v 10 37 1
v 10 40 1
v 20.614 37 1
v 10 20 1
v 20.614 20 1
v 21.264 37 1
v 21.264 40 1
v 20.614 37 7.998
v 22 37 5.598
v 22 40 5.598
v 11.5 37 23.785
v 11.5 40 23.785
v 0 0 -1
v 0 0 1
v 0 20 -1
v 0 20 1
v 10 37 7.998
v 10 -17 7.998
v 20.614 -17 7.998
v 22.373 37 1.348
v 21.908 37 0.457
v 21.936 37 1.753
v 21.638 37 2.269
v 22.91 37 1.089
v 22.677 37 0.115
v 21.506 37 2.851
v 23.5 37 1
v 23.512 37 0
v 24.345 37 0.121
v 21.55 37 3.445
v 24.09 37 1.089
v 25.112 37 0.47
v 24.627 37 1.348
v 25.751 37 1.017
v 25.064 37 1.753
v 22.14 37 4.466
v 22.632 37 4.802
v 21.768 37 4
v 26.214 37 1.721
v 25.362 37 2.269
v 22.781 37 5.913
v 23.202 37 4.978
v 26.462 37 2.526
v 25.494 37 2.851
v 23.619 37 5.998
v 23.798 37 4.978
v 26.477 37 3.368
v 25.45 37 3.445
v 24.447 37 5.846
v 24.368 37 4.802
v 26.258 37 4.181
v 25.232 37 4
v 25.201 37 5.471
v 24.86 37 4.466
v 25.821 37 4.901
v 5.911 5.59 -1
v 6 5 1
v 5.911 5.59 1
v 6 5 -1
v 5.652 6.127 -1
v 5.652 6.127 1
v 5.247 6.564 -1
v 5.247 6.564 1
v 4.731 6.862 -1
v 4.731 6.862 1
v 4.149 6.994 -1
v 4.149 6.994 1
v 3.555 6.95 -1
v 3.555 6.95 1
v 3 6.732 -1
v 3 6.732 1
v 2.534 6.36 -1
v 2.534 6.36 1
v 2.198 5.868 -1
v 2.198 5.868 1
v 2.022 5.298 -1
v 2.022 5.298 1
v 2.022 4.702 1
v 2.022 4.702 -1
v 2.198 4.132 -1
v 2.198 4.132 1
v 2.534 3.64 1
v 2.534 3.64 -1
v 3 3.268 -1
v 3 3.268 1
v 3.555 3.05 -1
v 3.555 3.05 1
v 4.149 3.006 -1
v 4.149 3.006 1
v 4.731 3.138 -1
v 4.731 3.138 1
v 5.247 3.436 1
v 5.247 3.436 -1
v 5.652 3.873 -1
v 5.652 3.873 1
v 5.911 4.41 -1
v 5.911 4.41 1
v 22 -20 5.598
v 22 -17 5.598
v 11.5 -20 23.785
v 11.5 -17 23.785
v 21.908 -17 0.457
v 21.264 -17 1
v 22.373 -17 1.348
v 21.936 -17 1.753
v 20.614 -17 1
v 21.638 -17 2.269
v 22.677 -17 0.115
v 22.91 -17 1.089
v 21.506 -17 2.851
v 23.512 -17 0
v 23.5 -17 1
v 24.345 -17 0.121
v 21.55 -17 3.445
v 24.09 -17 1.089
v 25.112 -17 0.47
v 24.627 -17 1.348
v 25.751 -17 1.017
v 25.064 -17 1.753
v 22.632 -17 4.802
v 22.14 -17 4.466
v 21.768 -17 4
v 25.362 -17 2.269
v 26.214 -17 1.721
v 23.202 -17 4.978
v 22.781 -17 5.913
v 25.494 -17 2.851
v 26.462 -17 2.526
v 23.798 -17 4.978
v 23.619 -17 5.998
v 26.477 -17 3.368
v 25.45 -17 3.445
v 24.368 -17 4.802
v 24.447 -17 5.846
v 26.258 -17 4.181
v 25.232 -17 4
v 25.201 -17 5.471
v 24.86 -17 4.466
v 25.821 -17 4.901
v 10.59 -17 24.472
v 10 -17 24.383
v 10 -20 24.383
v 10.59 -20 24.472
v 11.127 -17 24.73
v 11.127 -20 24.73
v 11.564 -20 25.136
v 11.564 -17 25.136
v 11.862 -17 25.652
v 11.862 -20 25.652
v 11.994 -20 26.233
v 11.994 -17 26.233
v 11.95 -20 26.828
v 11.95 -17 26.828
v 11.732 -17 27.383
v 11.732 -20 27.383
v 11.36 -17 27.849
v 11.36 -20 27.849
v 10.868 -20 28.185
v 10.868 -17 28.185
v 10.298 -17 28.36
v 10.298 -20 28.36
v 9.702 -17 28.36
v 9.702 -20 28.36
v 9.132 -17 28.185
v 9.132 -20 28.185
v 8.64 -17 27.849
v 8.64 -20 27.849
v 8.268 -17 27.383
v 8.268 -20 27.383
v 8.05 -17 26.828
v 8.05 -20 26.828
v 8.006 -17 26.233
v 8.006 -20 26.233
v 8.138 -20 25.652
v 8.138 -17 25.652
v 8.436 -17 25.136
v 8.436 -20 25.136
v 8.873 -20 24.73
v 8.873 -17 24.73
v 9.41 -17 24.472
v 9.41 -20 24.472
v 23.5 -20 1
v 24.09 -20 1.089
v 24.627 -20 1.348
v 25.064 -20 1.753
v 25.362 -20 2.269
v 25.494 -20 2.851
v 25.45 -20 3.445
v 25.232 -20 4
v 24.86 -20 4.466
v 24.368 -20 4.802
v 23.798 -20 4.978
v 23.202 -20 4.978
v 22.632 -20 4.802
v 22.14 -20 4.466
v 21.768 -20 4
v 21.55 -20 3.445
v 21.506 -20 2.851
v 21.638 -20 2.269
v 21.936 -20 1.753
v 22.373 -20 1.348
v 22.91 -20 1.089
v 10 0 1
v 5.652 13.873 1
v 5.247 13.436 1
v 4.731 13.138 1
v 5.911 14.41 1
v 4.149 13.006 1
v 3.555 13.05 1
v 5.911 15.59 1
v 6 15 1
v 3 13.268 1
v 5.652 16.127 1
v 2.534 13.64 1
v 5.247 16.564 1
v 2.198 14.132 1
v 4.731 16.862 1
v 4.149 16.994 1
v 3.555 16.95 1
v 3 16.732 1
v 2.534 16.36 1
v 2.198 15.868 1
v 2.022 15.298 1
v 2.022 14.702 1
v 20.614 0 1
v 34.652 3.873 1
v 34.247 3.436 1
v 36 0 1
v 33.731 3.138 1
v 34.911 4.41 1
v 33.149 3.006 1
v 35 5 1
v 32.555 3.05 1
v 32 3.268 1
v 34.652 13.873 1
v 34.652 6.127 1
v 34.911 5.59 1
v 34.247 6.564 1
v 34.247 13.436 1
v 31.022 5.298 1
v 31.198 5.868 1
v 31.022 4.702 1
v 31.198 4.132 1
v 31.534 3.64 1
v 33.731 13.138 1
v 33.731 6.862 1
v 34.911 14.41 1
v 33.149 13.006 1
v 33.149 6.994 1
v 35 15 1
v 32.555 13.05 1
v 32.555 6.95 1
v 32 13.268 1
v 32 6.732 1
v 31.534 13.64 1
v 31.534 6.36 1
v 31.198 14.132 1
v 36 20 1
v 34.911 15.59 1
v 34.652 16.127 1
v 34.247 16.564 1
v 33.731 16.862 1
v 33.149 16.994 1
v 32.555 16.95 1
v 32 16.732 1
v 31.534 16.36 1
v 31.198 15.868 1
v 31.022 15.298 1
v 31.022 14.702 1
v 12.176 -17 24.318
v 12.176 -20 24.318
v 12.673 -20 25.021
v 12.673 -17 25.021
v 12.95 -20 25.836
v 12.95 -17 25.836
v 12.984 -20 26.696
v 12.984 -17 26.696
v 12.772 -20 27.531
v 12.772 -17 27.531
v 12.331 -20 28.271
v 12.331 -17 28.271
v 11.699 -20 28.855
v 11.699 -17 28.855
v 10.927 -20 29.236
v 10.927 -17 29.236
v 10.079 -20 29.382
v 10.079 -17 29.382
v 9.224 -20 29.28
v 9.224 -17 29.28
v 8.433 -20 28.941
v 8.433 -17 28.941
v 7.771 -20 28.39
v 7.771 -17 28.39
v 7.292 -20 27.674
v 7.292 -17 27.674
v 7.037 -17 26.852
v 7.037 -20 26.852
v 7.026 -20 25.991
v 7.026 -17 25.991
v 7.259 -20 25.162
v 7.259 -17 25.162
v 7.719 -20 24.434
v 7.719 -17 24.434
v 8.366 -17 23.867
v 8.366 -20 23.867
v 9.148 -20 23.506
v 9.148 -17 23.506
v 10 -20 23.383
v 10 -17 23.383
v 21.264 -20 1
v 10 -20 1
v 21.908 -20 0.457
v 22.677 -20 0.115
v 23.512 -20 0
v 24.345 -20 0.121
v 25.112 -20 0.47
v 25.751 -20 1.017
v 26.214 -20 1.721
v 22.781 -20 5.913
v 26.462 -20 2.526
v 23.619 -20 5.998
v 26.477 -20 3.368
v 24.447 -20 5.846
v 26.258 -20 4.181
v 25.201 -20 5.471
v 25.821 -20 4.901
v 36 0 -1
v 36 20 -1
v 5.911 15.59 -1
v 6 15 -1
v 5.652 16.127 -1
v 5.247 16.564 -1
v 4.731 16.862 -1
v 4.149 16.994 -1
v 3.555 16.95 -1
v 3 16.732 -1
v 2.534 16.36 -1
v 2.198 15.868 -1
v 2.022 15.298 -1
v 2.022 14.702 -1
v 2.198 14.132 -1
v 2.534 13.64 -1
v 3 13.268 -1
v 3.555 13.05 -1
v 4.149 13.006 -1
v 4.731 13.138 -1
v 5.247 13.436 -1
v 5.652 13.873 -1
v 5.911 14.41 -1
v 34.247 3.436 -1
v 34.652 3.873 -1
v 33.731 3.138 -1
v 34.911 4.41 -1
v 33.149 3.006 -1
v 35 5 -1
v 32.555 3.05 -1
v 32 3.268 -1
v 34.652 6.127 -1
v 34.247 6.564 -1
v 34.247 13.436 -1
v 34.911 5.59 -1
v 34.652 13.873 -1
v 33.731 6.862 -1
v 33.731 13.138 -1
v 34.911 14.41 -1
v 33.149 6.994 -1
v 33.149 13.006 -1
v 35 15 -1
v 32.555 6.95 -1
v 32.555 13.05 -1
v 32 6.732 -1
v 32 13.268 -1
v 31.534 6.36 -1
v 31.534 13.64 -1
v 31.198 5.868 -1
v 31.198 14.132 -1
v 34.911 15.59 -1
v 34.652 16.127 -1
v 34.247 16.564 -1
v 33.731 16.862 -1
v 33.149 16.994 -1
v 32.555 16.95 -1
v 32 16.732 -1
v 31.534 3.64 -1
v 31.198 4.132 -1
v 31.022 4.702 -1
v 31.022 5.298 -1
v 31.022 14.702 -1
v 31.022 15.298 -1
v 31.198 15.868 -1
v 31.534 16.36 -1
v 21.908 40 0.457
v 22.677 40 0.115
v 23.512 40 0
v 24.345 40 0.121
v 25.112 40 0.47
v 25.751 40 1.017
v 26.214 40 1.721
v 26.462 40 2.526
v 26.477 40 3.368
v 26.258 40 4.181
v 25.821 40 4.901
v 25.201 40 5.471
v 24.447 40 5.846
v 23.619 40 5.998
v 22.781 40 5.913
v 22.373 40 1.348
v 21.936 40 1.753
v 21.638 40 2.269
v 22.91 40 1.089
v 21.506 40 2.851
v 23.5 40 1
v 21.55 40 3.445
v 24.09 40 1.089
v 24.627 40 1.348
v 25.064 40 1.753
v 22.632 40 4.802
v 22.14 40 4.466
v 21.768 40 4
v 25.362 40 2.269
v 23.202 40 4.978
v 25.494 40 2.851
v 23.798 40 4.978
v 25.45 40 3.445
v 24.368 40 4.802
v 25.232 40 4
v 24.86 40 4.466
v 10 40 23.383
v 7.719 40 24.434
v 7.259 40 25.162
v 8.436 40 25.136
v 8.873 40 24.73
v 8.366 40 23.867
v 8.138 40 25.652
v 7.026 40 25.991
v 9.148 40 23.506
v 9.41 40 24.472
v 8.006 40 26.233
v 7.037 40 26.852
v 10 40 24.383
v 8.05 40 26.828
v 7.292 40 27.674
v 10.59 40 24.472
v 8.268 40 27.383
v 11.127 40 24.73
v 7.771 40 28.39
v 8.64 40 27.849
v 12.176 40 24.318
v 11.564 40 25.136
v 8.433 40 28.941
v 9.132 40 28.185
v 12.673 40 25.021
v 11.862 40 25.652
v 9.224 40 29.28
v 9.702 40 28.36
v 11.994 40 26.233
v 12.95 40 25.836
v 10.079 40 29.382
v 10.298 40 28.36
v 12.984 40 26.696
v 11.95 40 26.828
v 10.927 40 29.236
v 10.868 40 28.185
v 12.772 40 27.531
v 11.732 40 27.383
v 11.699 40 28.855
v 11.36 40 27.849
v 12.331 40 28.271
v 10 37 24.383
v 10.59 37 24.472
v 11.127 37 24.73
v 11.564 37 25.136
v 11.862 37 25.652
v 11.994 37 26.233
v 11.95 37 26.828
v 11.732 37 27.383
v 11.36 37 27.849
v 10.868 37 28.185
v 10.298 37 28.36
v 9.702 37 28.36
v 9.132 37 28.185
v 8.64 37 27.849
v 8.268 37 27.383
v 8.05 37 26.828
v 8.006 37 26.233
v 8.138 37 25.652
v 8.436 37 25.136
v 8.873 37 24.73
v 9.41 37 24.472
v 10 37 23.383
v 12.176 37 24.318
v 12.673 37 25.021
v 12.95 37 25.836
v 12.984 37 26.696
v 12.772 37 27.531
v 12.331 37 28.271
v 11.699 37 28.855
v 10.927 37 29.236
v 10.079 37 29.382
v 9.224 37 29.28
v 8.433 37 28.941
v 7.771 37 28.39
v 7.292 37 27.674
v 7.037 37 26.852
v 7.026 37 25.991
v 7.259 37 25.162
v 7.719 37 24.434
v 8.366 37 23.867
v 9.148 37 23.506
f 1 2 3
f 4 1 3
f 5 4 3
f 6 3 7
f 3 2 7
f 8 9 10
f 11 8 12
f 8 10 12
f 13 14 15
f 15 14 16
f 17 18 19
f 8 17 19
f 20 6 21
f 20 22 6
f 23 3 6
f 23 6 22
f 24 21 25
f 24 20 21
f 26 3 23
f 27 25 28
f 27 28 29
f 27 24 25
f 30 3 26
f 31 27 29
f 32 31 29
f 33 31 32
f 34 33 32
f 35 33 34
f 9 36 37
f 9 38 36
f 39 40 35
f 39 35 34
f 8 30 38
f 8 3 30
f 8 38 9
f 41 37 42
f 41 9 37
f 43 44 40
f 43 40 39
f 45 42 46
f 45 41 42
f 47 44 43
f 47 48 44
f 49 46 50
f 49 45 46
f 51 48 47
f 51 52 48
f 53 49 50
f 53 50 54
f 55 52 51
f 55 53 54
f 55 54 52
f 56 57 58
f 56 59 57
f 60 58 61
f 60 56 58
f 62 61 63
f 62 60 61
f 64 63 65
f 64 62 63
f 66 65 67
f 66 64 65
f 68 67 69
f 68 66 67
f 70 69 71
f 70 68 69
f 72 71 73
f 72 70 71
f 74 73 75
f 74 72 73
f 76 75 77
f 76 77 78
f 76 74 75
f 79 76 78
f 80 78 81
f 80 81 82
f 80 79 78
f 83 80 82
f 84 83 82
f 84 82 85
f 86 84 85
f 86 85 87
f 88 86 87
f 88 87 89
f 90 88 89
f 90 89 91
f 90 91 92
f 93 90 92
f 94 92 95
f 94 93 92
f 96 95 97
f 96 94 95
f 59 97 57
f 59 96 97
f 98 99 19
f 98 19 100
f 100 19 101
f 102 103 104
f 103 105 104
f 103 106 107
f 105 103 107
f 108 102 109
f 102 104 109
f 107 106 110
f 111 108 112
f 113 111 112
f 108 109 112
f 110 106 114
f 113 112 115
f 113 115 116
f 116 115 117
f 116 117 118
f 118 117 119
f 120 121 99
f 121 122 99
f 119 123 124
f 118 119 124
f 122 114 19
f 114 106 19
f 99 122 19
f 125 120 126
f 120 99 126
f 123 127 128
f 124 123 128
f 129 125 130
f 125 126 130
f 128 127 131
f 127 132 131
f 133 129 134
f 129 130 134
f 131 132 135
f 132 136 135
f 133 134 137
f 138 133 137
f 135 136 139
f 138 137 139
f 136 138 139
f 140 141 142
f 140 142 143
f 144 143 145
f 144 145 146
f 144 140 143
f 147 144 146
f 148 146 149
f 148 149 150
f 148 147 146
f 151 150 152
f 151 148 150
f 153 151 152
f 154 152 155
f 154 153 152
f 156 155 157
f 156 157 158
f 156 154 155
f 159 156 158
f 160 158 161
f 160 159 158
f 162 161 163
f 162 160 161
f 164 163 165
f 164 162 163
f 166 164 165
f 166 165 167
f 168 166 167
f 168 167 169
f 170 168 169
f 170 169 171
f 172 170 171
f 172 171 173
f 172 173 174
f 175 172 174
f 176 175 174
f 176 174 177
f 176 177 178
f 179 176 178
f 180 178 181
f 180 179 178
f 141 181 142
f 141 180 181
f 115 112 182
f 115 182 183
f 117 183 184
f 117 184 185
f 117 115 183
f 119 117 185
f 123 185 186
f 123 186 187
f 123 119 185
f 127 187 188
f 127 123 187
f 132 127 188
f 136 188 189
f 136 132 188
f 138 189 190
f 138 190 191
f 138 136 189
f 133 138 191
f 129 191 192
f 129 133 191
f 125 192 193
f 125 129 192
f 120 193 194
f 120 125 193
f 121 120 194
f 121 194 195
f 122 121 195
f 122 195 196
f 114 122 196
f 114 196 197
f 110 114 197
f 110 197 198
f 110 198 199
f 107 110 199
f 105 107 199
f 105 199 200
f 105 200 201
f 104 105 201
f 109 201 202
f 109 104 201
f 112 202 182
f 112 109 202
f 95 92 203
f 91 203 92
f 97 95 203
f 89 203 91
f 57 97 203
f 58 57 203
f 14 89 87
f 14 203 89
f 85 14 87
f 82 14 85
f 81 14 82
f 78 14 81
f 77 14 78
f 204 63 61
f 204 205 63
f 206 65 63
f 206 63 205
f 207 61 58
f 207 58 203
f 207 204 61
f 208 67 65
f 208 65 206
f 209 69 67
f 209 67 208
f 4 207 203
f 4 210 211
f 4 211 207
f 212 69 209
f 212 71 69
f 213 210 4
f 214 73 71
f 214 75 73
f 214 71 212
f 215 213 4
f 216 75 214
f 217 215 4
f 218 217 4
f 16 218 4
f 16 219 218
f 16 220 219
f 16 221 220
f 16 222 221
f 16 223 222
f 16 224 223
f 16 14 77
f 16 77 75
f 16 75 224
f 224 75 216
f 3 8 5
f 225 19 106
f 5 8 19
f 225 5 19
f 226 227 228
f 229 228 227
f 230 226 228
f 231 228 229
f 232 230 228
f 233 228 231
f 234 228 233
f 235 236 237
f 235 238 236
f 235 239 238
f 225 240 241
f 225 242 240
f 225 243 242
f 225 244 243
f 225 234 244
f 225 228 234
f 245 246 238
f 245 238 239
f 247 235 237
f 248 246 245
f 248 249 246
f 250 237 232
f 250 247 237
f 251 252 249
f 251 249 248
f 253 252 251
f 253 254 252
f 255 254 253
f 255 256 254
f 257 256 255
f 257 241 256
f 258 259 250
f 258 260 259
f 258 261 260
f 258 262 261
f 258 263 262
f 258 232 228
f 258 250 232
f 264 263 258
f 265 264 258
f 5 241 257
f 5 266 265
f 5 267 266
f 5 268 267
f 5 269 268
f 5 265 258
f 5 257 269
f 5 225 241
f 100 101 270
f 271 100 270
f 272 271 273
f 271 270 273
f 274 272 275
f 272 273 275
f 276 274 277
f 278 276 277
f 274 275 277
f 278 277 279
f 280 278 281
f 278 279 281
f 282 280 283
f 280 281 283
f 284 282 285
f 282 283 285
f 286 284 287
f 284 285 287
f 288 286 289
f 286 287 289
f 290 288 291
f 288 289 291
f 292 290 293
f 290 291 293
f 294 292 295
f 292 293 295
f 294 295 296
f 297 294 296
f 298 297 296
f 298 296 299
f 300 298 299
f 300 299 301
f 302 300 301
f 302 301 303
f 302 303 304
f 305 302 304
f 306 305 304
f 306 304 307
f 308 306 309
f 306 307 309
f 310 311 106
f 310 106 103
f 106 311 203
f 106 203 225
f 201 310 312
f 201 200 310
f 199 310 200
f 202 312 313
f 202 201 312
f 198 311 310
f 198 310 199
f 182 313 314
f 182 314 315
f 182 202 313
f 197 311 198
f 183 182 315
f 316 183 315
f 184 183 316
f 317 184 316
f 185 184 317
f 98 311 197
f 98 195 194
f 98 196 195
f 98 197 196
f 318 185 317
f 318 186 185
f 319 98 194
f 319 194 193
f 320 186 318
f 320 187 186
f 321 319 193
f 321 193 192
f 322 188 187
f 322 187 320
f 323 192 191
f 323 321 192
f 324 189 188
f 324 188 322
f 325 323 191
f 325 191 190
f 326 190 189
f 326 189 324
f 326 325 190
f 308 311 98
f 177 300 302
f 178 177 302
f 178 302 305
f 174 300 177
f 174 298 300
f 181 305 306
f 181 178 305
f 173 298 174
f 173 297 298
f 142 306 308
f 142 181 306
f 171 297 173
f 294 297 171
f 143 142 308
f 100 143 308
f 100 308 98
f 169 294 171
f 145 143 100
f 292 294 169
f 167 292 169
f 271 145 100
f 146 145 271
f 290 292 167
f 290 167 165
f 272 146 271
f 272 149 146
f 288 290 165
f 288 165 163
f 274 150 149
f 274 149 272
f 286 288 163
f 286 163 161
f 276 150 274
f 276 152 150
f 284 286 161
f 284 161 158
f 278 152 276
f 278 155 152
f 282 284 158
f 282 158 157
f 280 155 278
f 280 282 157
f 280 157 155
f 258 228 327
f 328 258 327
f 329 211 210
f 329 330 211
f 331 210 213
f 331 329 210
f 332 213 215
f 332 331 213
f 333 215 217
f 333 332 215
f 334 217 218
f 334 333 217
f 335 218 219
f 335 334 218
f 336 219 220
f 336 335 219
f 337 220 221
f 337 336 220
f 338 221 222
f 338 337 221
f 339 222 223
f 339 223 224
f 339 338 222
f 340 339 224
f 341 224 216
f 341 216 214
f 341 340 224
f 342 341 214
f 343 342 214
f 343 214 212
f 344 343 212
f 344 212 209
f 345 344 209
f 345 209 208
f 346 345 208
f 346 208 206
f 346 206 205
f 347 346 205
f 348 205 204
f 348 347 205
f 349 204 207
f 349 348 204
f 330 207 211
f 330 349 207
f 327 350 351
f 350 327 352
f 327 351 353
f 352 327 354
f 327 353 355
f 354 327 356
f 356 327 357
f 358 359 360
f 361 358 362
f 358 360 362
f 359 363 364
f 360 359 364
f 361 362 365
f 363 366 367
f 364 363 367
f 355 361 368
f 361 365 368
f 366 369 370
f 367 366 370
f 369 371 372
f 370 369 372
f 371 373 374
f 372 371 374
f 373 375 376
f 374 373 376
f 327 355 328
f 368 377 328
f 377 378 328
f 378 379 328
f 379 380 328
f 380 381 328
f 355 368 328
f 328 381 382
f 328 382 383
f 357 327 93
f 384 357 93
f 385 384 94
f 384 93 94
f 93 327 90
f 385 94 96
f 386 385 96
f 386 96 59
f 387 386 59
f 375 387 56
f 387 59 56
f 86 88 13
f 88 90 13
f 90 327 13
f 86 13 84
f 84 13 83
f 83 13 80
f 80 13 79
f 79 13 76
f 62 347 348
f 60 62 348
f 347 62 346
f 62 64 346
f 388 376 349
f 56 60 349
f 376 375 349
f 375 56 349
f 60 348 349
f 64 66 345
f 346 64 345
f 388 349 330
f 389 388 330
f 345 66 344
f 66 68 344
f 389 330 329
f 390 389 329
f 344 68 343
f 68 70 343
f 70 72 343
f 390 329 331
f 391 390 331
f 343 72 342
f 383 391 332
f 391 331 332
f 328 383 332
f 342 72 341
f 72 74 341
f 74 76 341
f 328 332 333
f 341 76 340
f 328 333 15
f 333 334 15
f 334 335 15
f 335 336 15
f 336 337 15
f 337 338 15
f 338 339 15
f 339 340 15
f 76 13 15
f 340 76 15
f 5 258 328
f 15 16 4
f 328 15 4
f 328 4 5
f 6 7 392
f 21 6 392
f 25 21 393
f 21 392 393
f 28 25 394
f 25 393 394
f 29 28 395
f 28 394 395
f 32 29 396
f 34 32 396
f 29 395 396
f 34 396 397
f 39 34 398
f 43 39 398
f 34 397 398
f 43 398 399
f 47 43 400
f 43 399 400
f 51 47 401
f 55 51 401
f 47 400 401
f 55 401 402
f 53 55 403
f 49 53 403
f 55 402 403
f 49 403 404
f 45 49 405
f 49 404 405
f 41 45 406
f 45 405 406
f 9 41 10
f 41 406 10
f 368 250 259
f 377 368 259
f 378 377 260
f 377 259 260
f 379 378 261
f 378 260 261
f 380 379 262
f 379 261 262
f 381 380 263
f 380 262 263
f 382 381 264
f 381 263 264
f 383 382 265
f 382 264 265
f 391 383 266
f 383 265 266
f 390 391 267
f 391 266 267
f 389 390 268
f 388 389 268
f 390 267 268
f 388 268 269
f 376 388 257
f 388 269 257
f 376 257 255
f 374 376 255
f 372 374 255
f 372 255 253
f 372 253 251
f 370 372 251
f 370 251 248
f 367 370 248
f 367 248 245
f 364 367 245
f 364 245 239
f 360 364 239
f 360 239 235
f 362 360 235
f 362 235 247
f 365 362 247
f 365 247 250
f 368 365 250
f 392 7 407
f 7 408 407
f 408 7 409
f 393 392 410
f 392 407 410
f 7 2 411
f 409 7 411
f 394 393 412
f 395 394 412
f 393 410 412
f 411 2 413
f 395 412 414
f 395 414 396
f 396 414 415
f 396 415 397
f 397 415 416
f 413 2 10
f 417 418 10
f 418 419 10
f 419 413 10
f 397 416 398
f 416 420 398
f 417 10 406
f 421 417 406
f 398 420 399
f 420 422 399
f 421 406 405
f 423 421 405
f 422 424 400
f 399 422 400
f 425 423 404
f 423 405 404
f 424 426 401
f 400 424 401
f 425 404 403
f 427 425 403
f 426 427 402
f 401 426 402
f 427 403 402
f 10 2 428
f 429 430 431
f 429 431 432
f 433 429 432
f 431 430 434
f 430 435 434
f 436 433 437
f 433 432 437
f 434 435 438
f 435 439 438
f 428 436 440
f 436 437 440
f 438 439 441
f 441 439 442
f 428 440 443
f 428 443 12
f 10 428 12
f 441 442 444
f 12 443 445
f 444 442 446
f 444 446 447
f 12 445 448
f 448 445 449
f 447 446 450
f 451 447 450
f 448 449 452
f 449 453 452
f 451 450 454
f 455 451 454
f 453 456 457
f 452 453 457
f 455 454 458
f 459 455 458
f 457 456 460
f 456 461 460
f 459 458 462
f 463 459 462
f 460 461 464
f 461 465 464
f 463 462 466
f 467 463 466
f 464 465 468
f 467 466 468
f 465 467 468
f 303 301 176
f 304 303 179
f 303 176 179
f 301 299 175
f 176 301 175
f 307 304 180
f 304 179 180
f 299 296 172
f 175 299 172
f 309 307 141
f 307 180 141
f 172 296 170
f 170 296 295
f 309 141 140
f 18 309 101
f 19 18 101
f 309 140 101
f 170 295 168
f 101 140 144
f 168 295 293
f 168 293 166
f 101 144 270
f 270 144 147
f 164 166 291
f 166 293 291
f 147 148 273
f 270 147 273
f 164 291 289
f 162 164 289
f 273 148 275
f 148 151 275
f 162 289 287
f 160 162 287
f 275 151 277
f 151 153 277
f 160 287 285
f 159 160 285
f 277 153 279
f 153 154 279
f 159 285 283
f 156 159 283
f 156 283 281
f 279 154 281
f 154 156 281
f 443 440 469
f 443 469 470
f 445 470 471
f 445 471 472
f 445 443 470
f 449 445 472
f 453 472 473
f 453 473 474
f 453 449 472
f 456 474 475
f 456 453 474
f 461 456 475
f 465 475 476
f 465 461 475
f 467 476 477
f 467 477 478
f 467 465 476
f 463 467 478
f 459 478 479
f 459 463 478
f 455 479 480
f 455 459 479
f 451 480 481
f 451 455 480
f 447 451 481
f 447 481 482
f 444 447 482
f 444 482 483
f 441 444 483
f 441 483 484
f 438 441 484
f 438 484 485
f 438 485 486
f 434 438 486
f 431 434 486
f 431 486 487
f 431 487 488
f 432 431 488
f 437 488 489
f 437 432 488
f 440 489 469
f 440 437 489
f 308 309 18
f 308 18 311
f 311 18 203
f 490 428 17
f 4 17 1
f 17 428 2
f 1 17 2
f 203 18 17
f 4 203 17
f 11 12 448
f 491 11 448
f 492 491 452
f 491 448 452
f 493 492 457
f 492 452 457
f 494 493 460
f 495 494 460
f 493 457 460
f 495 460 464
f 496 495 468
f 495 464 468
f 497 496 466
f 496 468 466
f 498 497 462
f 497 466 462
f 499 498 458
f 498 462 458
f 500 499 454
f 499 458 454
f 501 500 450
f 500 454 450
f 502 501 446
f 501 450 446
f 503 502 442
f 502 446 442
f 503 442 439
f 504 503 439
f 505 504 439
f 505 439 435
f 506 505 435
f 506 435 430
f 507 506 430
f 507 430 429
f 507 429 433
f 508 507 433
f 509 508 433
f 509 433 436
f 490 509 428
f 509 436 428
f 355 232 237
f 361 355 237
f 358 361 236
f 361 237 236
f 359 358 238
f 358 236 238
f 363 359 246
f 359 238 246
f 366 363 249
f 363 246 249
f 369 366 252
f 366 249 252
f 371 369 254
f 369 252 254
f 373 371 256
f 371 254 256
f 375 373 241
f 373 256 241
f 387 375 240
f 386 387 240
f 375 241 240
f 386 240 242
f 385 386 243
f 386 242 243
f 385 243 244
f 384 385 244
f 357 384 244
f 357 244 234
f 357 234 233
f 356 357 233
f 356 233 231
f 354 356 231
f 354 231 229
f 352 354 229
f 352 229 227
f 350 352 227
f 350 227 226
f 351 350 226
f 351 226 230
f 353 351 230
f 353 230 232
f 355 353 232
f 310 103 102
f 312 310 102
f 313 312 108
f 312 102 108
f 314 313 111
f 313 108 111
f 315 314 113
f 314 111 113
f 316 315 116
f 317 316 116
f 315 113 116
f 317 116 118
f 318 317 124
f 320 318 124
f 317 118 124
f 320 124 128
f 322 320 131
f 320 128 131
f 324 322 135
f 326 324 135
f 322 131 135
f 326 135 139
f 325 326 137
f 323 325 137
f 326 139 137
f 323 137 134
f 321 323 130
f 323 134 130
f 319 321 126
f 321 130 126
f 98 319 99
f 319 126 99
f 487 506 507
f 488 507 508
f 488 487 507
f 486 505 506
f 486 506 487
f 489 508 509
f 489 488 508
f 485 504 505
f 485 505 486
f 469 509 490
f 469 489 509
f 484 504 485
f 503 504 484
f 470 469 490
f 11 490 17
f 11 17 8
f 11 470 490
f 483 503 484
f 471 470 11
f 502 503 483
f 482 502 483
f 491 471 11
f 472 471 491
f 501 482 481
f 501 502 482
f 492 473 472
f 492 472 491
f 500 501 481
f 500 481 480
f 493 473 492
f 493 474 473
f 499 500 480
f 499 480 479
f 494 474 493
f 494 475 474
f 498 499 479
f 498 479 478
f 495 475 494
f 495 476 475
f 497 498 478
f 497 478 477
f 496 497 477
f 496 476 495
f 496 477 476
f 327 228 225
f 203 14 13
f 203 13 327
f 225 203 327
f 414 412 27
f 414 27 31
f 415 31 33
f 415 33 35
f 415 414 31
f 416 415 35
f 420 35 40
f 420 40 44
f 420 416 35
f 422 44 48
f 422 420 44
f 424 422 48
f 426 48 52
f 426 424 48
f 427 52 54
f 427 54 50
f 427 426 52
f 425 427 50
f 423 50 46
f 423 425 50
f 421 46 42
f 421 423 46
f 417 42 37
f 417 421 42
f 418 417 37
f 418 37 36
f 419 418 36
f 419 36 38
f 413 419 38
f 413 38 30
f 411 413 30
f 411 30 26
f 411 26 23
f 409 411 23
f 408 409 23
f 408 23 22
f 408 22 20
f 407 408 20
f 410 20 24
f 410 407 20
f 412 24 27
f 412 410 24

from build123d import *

# Parameters (mm, degrees)
SKETCH_1_W          = 30
SKETCH_1_H          = 20
SKETCH_1_R          = 2
EXTRUDE_2_DEPTH     = 1
SKETCH_3_W          = 2
SKETCH_3_H          = 20
EXTRUDE_4_DEPTH     = 6
SKETCH_4_R          = 2
CUT_EXTRUDE_1_DEPTH = 6
EXTRUDE_START       = -17
SKETCH_8_W          = 10.614335182
SKETCH_8_H          = 6.998118079
EXTRUDE_6_DEPTH     = 54
EXTRUDE_START_2     = 17
SKETCH_2_R          = 2
EXTRUDE_7_DEPTH     = 3
EXTRUDE_START_3     = -40
SKETCH_2_2_R        = 2
EXTRUDE_8_DEPTH     = 3


with BuildPart() as part:
    # 草图1 → 凸台-拉伸2 (new, symmetric)
    with BuildSketch(Plane.XY):
        with Locations((15, 10)):
            Rectangle(SKETCH_1_W, SKETCH_1_H)
        with Locations((4, 15)):
            Circle(SKETCH_1_R, mode=Mode.SUBTRACT)
        with Locations((4, 5)):
            Circle(SKETCH_1_R, mode=Mode.SUBTRACT)
    extrude(amount=EXTRUDE_2_DEPTH, both=True)

    # 草图3 → 凸台-拉伸4 (add)
    with BuildSketch(Plane(origin=(30, 0, 0), x_dir=(0, 0, -1), z_dir=(1, 0, 0))):
        with Locations((0, 10)):
            Rectangle(SKETCH_3_W, SKETCH_3_H)
    extrude(amount=EXTRUDE_4_DEPTH)

    # 草图4 → 切除-拉伸1 (cut)
    with BuildSketch(Plane.XY.offset(1)):
        with Locations((33, 15)):
            Circle(SKETCH_4_R)
        with Locations((33, 5)):
            Circle(SKETCH_4_R)
    extrude(amount=-CUT_EXTRUDE_1_DEPTH, mode=Mode.SUBTRACT)

    # 草图8 → 凸台-拉伸6 (add)
    with BuildSketch(Plane(origin=(0, 0, 0), x_dir=(1, 0, 0), z_dir=(0, 1, 0)).offset(EXTRUDE_START)):
        with Locations((15.307167591, -4.49905904)):
            Rectangle(SKETCH_8_W, SKETCH_8_H)
    extrude(amount=EXTRUDE_6_DEPTH)

    # 草图2 → 凸台-拉伸7 (add)
    with BuildSketch(Plane.XZ.offset(EXTRUDE_START_2)):
        with BuildLine():
            Line((10, 1), (21.263932023, 1))
            ThreePointArc((21.263932023, 1), (26.462284118, 2.525792445), (22, 5.598076211))
            Line((22, 5.598076211), (11.5, 23.784609691))
            ThreePointArc((11.5, 23.784609691), (9.223542865, 29.280463381), (10, 23.382685902))
            Line((10, 23.382685902), (10, 3))
            Line((10, 3), (10, 1))
        make_face()
        with Locations(Location((23.5, 3, 0), (0, 0, 270))):
            Circle(SKETCH_2_R, mode=Mode.SUBTRACT)
        with Locations(Location((10, 26.382685902, 0), (0, 0, 270))):
            Circle(SKETCH_2_R, mode=Mode.SUBTRACT)
    extrude(amount=EXTRUDE_7_DEPTH)

    # 草图2<2> → 凸台-拉伸8 (add)
    with BuildSketch(Plane.XZ.offset(EXTRUDE_START_3)):
        with BuildLine():
            Line((10, 1), (21.263932023, 1))
            ThreePointArc((21.263932023, 1), (26.462284118, 2.525792445), (22, 5.598076211))
            Line((22, 5.598076211), (11.5, 23.784609691))
            ThreePointArc((11.5, 23.784609691), (9.223542865, 29.280463381), (10, 23.382685902))
            Line((10, 23.382685902), (10, 3))
            Line((10, 3), (10, 1))
        make_face()
        with Locations(Location((23.5, 3, 0), (0, 0, 270))):
            Circle(SKETCH_2_2_R, mode=Mode.SUBTRACT)
        with Locations(Location((10, 26.382685902, 0), (0, 0, 270))):
            Circle(SKETCH_2_2_R, mode=Mode.SUBTRACT)
    extrude(amount=EXTRUDE_8_DEPTH)


solid = part.part
